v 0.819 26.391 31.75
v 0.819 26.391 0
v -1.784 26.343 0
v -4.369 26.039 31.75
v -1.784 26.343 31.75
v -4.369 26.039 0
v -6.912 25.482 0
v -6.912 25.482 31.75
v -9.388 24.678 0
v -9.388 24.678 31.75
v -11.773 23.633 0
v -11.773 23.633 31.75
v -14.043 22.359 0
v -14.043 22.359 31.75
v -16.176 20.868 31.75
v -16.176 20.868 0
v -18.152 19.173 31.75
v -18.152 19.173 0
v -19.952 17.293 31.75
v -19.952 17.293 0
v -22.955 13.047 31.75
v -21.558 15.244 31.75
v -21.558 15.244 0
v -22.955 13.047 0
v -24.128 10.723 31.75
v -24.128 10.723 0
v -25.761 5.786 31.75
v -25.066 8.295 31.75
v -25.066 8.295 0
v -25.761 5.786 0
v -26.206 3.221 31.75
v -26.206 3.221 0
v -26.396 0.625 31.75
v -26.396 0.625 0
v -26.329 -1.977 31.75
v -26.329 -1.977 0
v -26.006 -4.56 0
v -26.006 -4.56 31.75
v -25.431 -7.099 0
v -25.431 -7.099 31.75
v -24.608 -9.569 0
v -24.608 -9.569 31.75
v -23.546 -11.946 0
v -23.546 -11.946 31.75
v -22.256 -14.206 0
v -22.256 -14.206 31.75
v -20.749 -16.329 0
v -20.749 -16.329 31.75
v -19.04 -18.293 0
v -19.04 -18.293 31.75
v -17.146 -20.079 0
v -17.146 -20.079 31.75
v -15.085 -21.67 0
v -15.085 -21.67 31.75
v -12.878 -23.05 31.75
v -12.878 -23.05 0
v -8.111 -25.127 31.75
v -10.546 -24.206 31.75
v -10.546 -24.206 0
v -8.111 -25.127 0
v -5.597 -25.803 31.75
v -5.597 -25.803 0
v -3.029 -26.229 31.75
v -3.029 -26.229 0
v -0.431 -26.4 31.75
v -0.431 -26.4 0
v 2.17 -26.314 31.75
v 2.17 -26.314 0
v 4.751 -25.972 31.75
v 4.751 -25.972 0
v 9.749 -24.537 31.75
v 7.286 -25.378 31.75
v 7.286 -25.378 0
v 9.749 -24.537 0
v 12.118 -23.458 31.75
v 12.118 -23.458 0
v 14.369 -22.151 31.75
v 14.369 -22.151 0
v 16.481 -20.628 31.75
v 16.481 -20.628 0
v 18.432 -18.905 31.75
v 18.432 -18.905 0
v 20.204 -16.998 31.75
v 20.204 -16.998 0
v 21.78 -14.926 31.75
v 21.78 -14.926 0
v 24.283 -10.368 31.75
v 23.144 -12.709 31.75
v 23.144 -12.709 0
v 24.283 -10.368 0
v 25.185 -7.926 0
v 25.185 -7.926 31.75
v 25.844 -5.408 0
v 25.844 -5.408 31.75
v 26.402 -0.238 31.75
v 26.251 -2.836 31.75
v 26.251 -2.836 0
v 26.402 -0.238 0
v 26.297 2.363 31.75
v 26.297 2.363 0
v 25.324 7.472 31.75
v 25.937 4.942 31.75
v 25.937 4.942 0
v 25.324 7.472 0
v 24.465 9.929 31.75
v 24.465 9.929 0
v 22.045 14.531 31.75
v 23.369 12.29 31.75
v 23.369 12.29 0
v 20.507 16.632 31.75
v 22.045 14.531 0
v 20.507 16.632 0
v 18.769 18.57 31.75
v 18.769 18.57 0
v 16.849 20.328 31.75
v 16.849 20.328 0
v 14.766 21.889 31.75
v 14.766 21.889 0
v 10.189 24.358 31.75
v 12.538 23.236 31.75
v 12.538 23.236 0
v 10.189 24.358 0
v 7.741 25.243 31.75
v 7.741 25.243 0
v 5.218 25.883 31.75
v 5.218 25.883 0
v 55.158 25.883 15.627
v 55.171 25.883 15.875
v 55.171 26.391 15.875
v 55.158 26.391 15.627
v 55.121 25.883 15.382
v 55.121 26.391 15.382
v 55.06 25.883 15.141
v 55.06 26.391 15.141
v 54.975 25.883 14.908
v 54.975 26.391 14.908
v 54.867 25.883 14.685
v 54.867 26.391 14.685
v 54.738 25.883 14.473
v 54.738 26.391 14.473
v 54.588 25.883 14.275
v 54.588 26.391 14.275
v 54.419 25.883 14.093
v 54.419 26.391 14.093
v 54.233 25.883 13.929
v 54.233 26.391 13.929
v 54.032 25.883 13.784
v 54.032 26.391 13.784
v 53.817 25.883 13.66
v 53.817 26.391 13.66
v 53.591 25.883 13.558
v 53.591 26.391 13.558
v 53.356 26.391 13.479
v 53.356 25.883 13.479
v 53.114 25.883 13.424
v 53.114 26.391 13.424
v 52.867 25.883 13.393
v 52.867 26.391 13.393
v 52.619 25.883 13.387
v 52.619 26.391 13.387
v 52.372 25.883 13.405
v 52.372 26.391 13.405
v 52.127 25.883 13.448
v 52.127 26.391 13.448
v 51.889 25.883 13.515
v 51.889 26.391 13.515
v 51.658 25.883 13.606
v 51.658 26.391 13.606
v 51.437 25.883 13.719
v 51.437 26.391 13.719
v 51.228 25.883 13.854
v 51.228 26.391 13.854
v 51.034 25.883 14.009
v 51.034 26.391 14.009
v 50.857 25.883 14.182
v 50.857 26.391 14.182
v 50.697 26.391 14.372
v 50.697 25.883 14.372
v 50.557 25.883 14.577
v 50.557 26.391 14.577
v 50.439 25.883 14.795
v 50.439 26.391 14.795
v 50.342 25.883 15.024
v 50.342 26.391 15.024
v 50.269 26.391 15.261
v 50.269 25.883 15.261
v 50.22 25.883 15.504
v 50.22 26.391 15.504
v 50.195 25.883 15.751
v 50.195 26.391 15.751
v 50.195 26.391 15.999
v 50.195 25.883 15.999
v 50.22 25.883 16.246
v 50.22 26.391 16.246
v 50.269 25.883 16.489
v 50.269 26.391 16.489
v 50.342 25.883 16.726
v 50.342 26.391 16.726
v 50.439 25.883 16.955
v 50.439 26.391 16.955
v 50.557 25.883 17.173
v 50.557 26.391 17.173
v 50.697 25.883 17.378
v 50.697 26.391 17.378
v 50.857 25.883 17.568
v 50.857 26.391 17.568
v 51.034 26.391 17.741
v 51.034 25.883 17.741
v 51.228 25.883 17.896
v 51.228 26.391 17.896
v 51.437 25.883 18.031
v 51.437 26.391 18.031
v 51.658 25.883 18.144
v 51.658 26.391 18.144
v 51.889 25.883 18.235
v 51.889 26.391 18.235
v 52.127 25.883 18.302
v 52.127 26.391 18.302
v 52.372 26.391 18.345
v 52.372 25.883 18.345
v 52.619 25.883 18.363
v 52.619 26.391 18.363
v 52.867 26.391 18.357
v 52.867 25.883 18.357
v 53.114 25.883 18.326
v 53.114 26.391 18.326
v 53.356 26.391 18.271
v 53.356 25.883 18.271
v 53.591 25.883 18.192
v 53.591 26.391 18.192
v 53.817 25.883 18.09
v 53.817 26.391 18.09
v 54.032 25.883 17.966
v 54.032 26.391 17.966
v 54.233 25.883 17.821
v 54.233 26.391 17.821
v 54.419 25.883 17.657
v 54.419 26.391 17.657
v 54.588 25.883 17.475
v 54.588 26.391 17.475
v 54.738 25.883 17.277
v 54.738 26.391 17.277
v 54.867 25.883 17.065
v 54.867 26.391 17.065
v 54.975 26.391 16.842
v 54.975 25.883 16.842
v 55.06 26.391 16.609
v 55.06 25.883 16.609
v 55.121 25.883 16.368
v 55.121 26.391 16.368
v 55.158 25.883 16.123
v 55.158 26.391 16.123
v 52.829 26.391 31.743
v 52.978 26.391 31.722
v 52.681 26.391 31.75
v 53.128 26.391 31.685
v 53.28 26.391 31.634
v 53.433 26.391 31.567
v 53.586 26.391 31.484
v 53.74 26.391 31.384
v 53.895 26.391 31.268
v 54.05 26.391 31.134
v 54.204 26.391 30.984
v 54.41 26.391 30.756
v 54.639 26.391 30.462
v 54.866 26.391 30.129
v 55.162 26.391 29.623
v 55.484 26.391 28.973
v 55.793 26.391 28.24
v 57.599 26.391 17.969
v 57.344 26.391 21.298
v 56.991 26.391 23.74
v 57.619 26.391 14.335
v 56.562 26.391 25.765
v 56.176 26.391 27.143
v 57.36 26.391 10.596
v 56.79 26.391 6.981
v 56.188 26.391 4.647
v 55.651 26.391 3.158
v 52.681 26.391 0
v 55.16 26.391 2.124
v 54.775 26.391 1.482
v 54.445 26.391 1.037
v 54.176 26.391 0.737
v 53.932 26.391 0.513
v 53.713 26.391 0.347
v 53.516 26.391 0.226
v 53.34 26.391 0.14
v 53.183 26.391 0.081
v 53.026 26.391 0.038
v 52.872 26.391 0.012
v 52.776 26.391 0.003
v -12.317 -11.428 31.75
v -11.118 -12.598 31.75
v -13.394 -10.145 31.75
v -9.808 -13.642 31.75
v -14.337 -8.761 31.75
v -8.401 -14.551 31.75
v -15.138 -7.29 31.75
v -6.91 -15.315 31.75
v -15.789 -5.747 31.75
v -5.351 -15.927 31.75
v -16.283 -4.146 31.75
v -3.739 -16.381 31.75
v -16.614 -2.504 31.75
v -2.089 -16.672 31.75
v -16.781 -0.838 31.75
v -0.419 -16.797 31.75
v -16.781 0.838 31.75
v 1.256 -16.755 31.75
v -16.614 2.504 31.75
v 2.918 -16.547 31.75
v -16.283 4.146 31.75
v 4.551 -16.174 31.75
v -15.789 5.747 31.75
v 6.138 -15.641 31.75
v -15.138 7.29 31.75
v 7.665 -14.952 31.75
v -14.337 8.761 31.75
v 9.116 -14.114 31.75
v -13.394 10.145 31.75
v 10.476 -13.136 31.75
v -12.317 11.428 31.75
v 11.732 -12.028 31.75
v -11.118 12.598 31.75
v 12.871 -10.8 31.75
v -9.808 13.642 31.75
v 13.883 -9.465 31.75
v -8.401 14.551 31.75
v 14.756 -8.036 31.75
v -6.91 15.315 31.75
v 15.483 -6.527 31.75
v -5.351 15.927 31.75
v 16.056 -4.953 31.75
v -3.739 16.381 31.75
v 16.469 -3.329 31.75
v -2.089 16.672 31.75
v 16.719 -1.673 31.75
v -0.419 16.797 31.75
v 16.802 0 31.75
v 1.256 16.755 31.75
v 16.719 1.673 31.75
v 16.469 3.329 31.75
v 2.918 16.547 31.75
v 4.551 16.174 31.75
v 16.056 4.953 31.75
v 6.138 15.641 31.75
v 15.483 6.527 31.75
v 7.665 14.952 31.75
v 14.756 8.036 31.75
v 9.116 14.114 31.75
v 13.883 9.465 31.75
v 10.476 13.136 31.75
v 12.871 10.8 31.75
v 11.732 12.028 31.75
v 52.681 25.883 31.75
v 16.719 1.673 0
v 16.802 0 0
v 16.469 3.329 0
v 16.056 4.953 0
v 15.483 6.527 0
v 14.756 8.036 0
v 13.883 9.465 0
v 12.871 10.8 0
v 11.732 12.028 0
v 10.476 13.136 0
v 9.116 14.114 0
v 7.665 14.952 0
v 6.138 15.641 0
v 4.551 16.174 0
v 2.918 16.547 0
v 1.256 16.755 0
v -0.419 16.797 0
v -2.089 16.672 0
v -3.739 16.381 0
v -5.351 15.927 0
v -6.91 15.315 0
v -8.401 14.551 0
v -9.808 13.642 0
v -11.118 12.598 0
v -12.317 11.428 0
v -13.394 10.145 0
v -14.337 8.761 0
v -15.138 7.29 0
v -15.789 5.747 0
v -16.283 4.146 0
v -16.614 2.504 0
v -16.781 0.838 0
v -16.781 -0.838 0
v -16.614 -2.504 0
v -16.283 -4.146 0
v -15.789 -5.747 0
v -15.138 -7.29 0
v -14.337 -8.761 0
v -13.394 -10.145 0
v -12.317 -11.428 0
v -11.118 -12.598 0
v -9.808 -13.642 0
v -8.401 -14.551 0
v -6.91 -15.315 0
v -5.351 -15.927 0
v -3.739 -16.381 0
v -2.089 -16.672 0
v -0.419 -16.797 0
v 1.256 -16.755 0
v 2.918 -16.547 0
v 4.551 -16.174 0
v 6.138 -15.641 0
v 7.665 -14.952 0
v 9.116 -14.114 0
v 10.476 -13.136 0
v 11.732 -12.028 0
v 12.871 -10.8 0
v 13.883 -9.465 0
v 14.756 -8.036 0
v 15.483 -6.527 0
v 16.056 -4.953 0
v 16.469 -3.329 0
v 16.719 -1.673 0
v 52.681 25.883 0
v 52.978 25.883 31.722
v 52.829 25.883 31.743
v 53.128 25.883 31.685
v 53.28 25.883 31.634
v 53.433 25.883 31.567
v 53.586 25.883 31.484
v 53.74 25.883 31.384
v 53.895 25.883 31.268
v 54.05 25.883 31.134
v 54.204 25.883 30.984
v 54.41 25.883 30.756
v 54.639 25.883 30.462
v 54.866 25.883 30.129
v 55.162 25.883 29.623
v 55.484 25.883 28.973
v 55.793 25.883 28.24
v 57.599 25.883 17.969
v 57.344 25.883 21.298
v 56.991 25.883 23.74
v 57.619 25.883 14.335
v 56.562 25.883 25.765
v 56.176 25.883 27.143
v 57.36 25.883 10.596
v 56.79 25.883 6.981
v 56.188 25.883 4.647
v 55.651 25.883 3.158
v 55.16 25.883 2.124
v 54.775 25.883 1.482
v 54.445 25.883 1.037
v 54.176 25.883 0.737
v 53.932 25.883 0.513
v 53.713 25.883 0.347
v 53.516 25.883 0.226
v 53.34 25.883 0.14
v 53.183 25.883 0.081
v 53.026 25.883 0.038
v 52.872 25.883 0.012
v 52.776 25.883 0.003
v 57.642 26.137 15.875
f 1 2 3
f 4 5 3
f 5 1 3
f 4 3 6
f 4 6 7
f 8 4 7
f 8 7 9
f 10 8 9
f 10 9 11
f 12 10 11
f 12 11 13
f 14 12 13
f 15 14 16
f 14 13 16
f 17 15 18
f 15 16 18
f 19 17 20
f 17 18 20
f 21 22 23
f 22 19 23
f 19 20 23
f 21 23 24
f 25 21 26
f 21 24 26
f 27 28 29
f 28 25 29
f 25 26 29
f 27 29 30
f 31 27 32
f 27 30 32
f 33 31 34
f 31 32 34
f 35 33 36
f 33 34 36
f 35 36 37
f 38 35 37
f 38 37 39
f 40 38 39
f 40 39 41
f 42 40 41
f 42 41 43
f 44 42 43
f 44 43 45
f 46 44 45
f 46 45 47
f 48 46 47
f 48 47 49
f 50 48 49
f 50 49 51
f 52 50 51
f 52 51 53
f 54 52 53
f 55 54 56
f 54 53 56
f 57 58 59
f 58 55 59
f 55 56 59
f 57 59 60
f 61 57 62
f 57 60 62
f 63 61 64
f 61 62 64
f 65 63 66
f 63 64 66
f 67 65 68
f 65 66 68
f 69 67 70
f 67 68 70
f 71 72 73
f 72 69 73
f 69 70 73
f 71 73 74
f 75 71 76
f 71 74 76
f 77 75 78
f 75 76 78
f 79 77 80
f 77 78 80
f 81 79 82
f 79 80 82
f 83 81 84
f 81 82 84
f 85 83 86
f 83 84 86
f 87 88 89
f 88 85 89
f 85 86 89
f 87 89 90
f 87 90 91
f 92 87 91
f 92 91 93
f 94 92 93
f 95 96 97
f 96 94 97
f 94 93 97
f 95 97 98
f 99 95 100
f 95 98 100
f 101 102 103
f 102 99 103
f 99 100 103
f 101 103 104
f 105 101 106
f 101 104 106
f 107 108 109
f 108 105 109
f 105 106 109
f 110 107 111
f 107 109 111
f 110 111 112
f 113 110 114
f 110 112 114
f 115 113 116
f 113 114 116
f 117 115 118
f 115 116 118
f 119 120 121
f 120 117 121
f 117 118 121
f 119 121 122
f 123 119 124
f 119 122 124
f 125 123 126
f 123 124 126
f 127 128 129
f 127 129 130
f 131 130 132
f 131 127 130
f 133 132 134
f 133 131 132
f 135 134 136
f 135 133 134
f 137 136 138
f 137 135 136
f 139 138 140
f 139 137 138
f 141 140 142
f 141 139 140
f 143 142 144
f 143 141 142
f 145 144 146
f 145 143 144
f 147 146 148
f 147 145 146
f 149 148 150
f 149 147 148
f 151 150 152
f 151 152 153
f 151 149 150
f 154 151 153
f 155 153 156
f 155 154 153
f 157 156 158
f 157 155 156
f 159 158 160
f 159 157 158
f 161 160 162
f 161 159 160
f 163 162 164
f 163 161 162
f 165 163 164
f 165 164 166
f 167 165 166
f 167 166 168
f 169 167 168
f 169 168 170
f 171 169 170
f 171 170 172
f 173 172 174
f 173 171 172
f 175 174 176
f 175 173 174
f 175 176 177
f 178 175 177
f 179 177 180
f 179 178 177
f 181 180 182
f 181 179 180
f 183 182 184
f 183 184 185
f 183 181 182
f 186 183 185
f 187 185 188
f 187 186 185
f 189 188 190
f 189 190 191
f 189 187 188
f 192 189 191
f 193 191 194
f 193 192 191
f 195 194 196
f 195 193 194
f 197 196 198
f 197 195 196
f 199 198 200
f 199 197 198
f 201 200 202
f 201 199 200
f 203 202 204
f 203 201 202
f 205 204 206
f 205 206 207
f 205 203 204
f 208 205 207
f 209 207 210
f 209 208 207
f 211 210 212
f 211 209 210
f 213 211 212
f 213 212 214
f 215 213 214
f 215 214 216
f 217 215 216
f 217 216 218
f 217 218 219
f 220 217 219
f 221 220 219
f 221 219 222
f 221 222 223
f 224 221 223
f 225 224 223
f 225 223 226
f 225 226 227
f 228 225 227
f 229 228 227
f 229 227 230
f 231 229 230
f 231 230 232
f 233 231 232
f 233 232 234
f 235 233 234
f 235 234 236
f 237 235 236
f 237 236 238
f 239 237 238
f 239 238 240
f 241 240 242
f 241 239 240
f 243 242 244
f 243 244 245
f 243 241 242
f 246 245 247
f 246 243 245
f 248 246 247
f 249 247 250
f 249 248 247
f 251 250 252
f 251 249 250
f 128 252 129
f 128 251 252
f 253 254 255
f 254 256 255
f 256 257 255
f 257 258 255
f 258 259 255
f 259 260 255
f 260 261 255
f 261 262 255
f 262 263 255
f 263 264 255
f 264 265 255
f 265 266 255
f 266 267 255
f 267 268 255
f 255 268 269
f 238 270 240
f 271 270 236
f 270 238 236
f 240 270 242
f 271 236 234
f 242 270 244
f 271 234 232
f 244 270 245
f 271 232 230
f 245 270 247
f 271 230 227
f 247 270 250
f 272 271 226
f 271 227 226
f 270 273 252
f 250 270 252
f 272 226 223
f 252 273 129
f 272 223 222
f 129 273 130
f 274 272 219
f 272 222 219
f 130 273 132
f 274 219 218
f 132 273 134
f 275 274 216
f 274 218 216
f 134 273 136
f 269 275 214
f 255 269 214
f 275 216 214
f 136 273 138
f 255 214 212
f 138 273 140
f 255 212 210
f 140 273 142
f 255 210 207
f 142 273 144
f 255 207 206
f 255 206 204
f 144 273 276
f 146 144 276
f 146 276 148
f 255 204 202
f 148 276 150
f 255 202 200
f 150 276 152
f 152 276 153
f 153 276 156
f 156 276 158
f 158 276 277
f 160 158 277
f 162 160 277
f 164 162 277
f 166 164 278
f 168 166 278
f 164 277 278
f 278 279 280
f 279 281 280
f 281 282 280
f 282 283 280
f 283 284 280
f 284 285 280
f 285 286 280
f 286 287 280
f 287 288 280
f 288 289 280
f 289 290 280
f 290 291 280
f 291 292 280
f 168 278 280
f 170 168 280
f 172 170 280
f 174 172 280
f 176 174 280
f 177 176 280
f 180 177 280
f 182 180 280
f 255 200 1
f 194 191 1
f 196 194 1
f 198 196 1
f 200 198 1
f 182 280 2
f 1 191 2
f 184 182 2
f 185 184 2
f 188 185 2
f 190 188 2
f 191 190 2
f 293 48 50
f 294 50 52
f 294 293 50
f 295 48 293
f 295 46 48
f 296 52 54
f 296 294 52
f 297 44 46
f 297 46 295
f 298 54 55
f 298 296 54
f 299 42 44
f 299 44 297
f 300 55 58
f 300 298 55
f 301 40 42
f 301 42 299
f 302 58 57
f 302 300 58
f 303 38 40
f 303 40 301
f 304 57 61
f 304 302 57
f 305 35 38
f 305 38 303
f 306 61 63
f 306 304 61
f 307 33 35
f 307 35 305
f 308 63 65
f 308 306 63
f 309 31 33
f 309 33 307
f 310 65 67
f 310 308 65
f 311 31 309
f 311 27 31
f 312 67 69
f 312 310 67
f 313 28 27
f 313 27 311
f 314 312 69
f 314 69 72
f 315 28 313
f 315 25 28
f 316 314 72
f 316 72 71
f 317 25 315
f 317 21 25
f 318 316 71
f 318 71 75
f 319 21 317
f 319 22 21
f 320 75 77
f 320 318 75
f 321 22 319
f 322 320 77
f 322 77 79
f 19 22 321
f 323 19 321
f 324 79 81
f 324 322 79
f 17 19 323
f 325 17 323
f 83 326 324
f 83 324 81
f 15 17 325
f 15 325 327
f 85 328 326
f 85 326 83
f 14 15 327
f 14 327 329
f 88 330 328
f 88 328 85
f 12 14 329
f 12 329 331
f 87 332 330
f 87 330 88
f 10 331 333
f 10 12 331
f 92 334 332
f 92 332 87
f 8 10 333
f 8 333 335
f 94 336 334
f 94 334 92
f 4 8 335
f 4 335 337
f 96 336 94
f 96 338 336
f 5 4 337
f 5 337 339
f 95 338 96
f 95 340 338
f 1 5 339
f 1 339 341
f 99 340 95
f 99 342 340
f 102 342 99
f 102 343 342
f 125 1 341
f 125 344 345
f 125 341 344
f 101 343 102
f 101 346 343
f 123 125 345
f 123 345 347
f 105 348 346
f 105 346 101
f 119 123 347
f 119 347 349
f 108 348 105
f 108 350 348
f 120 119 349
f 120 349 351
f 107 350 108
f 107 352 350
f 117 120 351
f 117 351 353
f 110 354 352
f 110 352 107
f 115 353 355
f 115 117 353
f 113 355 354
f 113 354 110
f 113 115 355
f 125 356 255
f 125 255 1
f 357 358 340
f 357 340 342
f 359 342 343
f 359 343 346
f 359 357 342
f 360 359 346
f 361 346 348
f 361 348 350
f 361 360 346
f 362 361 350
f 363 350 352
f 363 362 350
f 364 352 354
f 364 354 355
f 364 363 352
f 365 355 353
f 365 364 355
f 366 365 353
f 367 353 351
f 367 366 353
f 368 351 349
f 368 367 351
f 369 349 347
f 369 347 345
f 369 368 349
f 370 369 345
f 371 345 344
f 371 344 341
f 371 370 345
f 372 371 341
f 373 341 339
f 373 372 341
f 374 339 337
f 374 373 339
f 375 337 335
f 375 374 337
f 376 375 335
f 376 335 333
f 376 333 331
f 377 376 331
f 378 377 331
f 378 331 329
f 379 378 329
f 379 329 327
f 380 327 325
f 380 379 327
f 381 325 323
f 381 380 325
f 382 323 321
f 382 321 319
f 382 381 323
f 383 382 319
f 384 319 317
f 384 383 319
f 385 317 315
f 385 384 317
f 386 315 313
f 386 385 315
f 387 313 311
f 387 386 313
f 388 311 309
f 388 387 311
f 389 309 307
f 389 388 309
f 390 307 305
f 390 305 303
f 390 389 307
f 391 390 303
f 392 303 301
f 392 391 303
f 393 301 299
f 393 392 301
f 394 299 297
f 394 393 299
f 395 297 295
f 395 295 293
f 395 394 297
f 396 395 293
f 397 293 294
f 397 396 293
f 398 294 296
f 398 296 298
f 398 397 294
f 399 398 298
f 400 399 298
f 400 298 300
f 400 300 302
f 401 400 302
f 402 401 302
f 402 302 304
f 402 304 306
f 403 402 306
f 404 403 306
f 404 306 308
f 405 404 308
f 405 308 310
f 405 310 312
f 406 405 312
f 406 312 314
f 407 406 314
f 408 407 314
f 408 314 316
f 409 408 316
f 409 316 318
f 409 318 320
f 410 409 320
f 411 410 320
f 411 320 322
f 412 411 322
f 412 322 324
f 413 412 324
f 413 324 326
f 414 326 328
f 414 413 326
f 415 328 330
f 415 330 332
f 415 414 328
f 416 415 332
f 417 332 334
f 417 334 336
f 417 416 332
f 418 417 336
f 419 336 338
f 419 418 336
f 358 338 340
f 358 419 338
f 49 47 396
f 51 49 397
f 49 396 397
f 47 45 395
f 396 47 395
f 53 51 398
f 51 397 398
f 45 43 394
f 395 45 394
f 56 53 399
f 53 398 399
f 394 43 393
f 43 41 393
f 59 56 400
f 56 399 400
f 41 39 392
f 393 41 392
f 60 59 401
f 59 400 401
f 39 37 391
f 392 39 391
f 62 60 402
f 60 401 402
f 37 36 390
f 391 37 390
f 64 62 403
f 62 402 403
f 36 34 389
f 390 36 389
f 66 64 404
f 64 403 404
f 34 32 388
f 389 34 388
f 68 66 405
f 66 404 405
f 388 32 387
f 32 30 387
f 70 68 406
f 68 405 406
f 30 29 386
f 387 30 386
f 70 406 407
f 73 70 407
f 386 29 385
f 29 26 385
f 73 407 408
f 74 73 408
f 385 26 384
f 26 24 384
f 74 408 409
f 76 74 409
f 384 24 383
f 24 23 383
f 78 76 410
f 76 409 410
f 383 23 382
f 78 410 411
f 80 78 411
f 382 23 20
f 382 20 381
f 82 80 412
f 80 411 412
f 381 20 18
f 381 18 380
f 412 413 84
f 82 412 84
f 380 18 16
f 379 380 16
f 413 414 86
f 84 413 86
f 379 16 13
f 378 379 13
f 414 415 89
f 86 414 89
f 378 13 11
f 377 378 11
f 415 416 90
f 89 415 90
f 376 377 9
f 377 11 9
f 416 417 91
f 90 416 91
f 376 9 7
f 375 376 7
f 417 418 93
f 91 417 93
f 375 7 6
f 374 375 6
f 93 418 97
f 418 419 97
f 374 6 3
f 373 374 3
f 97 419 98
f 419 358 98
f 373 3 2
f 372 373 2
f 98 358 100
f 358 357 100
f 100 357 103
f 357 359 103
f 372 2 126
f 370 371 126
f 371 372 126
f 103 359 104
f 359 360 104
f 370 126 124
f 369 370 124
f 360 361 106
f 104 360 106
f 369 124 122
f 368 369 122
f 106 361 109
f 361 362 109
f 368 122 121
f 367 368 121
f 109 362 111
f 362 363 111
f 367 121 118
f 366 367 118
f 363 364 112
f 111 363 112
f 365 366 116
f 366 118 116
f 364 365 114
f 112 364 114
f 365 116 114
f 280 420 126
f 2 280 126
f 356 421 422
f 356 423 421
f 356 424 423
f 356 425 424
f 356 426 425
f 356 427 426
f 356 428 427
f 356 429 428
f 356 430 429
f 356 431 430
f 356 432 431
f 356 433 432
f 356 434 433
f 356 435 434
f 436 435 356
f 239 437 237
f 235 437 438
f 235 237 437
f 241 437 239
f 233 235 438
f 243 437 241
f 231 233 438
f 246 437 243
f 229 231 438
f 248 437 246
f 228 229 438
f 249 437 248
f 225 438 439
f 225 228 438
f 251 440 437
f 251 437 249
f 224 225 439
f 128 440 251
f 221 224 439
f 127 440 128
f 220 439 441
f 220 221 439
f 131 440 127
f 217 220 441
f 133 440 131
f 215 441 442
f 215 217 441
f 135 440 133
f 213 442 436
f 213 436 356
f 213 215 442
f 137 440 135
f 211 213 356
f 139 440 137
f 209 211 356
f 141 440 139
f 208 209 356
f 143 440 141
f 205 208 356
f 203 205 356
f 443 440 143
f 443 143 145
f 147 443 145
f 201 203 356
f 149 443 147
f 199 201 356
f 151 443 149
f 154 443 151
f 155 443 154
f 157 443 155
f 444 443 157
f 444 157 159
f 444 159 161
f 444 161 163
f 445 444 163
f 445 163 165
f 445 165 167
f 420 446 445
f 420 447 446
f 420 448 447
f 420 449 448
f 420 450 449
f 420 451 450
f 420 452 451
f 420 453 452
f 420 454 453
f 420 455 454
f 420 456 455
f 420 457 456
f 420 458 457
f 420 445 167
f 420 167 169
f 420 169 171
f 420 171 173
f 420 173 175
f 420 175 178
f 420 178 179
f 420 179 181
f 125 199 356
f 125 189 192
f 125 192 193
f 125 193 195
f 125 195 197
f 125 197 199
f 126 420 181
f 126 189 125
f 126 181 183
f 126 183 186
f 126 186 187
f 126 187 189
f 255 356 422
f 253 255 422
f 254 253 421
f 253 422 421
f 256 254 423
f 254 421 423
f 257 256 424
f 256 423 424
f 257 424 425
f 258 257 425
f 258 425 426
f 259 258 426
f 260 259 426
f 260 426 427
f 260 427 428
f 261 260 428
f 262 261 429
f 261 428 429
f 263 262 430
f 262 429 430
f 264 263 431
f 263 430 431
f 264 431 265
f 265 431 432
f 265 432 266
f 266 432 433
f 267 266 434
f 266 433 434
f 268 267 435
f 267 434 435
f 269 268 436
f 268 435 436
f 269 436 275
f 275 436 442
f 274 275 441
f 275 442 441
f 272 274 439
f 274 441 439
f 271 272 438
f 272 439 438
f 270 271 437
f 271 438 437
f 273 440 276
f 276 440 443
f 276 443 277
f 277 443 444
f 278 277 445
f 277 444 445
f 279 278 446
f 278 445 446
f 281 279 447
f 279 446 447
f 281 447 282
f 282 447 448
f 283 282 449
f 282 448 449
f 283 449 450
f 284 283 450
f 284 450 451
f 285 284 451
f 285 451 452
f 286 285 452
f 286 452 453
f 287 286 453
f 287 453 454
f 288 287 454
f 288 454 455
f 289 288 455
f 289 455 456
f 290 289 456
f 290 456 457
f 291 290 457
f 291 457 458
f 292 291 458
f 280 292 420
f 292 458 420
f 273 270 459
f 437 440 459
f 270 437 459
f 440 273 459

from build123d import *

# Parameters (mm, degrees)
SKETCH1_R           = 26.4033
SKETCH1_R_2         = 16.8021
BOSS_EXTRUDE1_DEPTH = 31.75
SKETCH2_R           = 2.4892
BOSS_EXTRUDE2_DEPTH = 0.508


with BuildPart() as part:
    # Sketch1 → Boss-Extrude1 (new body)
    with BuildSketch(Plane.XY):
        Circle(SKETCH1_R)
        Circle(SKETCH1_R_2, mode=Mode.SUBTRACT)
    extrude(amount=BOSS_EXTRUDE1_DEPTH)

    # Sketch2 → Boss-Extrude2 (add)
    with BuildSketch(Plane(origin=(0, 25.8826, 0), x_dir=(1, 0, 0), z_dir=(0, 1, 0))):
        with BuildLine():
            Line((0, -31.75), (0, 0))
            Line((0, 0), (52.681392922, 0))
            add(Edge.make_bspline(
                [(52.681392922, -31.75), (57.642158889, -31.75), (57.642158889, -15.875), (57.642158889, 0), (52.681392922, 0)],
                knots=[3.141592654, 3.141592654, 3.141592654, 4.71238898, 4.71238898, 6.283185307, 6.283185307, 6.283185307], degree=2, weights=[1, 0.707106781, 1, 0.707106781, 1]))
            Line((52.681392922, -31.75), (0, -31.75))
        make_face()
        with Locations((52.681392922, -15.875)):
            Circle(SKETCH2_R, mode=Mode.SUBTRACT)
    extrude(amount=BOSS_EXTRUDE2_DEPTH)


solid = part.part
